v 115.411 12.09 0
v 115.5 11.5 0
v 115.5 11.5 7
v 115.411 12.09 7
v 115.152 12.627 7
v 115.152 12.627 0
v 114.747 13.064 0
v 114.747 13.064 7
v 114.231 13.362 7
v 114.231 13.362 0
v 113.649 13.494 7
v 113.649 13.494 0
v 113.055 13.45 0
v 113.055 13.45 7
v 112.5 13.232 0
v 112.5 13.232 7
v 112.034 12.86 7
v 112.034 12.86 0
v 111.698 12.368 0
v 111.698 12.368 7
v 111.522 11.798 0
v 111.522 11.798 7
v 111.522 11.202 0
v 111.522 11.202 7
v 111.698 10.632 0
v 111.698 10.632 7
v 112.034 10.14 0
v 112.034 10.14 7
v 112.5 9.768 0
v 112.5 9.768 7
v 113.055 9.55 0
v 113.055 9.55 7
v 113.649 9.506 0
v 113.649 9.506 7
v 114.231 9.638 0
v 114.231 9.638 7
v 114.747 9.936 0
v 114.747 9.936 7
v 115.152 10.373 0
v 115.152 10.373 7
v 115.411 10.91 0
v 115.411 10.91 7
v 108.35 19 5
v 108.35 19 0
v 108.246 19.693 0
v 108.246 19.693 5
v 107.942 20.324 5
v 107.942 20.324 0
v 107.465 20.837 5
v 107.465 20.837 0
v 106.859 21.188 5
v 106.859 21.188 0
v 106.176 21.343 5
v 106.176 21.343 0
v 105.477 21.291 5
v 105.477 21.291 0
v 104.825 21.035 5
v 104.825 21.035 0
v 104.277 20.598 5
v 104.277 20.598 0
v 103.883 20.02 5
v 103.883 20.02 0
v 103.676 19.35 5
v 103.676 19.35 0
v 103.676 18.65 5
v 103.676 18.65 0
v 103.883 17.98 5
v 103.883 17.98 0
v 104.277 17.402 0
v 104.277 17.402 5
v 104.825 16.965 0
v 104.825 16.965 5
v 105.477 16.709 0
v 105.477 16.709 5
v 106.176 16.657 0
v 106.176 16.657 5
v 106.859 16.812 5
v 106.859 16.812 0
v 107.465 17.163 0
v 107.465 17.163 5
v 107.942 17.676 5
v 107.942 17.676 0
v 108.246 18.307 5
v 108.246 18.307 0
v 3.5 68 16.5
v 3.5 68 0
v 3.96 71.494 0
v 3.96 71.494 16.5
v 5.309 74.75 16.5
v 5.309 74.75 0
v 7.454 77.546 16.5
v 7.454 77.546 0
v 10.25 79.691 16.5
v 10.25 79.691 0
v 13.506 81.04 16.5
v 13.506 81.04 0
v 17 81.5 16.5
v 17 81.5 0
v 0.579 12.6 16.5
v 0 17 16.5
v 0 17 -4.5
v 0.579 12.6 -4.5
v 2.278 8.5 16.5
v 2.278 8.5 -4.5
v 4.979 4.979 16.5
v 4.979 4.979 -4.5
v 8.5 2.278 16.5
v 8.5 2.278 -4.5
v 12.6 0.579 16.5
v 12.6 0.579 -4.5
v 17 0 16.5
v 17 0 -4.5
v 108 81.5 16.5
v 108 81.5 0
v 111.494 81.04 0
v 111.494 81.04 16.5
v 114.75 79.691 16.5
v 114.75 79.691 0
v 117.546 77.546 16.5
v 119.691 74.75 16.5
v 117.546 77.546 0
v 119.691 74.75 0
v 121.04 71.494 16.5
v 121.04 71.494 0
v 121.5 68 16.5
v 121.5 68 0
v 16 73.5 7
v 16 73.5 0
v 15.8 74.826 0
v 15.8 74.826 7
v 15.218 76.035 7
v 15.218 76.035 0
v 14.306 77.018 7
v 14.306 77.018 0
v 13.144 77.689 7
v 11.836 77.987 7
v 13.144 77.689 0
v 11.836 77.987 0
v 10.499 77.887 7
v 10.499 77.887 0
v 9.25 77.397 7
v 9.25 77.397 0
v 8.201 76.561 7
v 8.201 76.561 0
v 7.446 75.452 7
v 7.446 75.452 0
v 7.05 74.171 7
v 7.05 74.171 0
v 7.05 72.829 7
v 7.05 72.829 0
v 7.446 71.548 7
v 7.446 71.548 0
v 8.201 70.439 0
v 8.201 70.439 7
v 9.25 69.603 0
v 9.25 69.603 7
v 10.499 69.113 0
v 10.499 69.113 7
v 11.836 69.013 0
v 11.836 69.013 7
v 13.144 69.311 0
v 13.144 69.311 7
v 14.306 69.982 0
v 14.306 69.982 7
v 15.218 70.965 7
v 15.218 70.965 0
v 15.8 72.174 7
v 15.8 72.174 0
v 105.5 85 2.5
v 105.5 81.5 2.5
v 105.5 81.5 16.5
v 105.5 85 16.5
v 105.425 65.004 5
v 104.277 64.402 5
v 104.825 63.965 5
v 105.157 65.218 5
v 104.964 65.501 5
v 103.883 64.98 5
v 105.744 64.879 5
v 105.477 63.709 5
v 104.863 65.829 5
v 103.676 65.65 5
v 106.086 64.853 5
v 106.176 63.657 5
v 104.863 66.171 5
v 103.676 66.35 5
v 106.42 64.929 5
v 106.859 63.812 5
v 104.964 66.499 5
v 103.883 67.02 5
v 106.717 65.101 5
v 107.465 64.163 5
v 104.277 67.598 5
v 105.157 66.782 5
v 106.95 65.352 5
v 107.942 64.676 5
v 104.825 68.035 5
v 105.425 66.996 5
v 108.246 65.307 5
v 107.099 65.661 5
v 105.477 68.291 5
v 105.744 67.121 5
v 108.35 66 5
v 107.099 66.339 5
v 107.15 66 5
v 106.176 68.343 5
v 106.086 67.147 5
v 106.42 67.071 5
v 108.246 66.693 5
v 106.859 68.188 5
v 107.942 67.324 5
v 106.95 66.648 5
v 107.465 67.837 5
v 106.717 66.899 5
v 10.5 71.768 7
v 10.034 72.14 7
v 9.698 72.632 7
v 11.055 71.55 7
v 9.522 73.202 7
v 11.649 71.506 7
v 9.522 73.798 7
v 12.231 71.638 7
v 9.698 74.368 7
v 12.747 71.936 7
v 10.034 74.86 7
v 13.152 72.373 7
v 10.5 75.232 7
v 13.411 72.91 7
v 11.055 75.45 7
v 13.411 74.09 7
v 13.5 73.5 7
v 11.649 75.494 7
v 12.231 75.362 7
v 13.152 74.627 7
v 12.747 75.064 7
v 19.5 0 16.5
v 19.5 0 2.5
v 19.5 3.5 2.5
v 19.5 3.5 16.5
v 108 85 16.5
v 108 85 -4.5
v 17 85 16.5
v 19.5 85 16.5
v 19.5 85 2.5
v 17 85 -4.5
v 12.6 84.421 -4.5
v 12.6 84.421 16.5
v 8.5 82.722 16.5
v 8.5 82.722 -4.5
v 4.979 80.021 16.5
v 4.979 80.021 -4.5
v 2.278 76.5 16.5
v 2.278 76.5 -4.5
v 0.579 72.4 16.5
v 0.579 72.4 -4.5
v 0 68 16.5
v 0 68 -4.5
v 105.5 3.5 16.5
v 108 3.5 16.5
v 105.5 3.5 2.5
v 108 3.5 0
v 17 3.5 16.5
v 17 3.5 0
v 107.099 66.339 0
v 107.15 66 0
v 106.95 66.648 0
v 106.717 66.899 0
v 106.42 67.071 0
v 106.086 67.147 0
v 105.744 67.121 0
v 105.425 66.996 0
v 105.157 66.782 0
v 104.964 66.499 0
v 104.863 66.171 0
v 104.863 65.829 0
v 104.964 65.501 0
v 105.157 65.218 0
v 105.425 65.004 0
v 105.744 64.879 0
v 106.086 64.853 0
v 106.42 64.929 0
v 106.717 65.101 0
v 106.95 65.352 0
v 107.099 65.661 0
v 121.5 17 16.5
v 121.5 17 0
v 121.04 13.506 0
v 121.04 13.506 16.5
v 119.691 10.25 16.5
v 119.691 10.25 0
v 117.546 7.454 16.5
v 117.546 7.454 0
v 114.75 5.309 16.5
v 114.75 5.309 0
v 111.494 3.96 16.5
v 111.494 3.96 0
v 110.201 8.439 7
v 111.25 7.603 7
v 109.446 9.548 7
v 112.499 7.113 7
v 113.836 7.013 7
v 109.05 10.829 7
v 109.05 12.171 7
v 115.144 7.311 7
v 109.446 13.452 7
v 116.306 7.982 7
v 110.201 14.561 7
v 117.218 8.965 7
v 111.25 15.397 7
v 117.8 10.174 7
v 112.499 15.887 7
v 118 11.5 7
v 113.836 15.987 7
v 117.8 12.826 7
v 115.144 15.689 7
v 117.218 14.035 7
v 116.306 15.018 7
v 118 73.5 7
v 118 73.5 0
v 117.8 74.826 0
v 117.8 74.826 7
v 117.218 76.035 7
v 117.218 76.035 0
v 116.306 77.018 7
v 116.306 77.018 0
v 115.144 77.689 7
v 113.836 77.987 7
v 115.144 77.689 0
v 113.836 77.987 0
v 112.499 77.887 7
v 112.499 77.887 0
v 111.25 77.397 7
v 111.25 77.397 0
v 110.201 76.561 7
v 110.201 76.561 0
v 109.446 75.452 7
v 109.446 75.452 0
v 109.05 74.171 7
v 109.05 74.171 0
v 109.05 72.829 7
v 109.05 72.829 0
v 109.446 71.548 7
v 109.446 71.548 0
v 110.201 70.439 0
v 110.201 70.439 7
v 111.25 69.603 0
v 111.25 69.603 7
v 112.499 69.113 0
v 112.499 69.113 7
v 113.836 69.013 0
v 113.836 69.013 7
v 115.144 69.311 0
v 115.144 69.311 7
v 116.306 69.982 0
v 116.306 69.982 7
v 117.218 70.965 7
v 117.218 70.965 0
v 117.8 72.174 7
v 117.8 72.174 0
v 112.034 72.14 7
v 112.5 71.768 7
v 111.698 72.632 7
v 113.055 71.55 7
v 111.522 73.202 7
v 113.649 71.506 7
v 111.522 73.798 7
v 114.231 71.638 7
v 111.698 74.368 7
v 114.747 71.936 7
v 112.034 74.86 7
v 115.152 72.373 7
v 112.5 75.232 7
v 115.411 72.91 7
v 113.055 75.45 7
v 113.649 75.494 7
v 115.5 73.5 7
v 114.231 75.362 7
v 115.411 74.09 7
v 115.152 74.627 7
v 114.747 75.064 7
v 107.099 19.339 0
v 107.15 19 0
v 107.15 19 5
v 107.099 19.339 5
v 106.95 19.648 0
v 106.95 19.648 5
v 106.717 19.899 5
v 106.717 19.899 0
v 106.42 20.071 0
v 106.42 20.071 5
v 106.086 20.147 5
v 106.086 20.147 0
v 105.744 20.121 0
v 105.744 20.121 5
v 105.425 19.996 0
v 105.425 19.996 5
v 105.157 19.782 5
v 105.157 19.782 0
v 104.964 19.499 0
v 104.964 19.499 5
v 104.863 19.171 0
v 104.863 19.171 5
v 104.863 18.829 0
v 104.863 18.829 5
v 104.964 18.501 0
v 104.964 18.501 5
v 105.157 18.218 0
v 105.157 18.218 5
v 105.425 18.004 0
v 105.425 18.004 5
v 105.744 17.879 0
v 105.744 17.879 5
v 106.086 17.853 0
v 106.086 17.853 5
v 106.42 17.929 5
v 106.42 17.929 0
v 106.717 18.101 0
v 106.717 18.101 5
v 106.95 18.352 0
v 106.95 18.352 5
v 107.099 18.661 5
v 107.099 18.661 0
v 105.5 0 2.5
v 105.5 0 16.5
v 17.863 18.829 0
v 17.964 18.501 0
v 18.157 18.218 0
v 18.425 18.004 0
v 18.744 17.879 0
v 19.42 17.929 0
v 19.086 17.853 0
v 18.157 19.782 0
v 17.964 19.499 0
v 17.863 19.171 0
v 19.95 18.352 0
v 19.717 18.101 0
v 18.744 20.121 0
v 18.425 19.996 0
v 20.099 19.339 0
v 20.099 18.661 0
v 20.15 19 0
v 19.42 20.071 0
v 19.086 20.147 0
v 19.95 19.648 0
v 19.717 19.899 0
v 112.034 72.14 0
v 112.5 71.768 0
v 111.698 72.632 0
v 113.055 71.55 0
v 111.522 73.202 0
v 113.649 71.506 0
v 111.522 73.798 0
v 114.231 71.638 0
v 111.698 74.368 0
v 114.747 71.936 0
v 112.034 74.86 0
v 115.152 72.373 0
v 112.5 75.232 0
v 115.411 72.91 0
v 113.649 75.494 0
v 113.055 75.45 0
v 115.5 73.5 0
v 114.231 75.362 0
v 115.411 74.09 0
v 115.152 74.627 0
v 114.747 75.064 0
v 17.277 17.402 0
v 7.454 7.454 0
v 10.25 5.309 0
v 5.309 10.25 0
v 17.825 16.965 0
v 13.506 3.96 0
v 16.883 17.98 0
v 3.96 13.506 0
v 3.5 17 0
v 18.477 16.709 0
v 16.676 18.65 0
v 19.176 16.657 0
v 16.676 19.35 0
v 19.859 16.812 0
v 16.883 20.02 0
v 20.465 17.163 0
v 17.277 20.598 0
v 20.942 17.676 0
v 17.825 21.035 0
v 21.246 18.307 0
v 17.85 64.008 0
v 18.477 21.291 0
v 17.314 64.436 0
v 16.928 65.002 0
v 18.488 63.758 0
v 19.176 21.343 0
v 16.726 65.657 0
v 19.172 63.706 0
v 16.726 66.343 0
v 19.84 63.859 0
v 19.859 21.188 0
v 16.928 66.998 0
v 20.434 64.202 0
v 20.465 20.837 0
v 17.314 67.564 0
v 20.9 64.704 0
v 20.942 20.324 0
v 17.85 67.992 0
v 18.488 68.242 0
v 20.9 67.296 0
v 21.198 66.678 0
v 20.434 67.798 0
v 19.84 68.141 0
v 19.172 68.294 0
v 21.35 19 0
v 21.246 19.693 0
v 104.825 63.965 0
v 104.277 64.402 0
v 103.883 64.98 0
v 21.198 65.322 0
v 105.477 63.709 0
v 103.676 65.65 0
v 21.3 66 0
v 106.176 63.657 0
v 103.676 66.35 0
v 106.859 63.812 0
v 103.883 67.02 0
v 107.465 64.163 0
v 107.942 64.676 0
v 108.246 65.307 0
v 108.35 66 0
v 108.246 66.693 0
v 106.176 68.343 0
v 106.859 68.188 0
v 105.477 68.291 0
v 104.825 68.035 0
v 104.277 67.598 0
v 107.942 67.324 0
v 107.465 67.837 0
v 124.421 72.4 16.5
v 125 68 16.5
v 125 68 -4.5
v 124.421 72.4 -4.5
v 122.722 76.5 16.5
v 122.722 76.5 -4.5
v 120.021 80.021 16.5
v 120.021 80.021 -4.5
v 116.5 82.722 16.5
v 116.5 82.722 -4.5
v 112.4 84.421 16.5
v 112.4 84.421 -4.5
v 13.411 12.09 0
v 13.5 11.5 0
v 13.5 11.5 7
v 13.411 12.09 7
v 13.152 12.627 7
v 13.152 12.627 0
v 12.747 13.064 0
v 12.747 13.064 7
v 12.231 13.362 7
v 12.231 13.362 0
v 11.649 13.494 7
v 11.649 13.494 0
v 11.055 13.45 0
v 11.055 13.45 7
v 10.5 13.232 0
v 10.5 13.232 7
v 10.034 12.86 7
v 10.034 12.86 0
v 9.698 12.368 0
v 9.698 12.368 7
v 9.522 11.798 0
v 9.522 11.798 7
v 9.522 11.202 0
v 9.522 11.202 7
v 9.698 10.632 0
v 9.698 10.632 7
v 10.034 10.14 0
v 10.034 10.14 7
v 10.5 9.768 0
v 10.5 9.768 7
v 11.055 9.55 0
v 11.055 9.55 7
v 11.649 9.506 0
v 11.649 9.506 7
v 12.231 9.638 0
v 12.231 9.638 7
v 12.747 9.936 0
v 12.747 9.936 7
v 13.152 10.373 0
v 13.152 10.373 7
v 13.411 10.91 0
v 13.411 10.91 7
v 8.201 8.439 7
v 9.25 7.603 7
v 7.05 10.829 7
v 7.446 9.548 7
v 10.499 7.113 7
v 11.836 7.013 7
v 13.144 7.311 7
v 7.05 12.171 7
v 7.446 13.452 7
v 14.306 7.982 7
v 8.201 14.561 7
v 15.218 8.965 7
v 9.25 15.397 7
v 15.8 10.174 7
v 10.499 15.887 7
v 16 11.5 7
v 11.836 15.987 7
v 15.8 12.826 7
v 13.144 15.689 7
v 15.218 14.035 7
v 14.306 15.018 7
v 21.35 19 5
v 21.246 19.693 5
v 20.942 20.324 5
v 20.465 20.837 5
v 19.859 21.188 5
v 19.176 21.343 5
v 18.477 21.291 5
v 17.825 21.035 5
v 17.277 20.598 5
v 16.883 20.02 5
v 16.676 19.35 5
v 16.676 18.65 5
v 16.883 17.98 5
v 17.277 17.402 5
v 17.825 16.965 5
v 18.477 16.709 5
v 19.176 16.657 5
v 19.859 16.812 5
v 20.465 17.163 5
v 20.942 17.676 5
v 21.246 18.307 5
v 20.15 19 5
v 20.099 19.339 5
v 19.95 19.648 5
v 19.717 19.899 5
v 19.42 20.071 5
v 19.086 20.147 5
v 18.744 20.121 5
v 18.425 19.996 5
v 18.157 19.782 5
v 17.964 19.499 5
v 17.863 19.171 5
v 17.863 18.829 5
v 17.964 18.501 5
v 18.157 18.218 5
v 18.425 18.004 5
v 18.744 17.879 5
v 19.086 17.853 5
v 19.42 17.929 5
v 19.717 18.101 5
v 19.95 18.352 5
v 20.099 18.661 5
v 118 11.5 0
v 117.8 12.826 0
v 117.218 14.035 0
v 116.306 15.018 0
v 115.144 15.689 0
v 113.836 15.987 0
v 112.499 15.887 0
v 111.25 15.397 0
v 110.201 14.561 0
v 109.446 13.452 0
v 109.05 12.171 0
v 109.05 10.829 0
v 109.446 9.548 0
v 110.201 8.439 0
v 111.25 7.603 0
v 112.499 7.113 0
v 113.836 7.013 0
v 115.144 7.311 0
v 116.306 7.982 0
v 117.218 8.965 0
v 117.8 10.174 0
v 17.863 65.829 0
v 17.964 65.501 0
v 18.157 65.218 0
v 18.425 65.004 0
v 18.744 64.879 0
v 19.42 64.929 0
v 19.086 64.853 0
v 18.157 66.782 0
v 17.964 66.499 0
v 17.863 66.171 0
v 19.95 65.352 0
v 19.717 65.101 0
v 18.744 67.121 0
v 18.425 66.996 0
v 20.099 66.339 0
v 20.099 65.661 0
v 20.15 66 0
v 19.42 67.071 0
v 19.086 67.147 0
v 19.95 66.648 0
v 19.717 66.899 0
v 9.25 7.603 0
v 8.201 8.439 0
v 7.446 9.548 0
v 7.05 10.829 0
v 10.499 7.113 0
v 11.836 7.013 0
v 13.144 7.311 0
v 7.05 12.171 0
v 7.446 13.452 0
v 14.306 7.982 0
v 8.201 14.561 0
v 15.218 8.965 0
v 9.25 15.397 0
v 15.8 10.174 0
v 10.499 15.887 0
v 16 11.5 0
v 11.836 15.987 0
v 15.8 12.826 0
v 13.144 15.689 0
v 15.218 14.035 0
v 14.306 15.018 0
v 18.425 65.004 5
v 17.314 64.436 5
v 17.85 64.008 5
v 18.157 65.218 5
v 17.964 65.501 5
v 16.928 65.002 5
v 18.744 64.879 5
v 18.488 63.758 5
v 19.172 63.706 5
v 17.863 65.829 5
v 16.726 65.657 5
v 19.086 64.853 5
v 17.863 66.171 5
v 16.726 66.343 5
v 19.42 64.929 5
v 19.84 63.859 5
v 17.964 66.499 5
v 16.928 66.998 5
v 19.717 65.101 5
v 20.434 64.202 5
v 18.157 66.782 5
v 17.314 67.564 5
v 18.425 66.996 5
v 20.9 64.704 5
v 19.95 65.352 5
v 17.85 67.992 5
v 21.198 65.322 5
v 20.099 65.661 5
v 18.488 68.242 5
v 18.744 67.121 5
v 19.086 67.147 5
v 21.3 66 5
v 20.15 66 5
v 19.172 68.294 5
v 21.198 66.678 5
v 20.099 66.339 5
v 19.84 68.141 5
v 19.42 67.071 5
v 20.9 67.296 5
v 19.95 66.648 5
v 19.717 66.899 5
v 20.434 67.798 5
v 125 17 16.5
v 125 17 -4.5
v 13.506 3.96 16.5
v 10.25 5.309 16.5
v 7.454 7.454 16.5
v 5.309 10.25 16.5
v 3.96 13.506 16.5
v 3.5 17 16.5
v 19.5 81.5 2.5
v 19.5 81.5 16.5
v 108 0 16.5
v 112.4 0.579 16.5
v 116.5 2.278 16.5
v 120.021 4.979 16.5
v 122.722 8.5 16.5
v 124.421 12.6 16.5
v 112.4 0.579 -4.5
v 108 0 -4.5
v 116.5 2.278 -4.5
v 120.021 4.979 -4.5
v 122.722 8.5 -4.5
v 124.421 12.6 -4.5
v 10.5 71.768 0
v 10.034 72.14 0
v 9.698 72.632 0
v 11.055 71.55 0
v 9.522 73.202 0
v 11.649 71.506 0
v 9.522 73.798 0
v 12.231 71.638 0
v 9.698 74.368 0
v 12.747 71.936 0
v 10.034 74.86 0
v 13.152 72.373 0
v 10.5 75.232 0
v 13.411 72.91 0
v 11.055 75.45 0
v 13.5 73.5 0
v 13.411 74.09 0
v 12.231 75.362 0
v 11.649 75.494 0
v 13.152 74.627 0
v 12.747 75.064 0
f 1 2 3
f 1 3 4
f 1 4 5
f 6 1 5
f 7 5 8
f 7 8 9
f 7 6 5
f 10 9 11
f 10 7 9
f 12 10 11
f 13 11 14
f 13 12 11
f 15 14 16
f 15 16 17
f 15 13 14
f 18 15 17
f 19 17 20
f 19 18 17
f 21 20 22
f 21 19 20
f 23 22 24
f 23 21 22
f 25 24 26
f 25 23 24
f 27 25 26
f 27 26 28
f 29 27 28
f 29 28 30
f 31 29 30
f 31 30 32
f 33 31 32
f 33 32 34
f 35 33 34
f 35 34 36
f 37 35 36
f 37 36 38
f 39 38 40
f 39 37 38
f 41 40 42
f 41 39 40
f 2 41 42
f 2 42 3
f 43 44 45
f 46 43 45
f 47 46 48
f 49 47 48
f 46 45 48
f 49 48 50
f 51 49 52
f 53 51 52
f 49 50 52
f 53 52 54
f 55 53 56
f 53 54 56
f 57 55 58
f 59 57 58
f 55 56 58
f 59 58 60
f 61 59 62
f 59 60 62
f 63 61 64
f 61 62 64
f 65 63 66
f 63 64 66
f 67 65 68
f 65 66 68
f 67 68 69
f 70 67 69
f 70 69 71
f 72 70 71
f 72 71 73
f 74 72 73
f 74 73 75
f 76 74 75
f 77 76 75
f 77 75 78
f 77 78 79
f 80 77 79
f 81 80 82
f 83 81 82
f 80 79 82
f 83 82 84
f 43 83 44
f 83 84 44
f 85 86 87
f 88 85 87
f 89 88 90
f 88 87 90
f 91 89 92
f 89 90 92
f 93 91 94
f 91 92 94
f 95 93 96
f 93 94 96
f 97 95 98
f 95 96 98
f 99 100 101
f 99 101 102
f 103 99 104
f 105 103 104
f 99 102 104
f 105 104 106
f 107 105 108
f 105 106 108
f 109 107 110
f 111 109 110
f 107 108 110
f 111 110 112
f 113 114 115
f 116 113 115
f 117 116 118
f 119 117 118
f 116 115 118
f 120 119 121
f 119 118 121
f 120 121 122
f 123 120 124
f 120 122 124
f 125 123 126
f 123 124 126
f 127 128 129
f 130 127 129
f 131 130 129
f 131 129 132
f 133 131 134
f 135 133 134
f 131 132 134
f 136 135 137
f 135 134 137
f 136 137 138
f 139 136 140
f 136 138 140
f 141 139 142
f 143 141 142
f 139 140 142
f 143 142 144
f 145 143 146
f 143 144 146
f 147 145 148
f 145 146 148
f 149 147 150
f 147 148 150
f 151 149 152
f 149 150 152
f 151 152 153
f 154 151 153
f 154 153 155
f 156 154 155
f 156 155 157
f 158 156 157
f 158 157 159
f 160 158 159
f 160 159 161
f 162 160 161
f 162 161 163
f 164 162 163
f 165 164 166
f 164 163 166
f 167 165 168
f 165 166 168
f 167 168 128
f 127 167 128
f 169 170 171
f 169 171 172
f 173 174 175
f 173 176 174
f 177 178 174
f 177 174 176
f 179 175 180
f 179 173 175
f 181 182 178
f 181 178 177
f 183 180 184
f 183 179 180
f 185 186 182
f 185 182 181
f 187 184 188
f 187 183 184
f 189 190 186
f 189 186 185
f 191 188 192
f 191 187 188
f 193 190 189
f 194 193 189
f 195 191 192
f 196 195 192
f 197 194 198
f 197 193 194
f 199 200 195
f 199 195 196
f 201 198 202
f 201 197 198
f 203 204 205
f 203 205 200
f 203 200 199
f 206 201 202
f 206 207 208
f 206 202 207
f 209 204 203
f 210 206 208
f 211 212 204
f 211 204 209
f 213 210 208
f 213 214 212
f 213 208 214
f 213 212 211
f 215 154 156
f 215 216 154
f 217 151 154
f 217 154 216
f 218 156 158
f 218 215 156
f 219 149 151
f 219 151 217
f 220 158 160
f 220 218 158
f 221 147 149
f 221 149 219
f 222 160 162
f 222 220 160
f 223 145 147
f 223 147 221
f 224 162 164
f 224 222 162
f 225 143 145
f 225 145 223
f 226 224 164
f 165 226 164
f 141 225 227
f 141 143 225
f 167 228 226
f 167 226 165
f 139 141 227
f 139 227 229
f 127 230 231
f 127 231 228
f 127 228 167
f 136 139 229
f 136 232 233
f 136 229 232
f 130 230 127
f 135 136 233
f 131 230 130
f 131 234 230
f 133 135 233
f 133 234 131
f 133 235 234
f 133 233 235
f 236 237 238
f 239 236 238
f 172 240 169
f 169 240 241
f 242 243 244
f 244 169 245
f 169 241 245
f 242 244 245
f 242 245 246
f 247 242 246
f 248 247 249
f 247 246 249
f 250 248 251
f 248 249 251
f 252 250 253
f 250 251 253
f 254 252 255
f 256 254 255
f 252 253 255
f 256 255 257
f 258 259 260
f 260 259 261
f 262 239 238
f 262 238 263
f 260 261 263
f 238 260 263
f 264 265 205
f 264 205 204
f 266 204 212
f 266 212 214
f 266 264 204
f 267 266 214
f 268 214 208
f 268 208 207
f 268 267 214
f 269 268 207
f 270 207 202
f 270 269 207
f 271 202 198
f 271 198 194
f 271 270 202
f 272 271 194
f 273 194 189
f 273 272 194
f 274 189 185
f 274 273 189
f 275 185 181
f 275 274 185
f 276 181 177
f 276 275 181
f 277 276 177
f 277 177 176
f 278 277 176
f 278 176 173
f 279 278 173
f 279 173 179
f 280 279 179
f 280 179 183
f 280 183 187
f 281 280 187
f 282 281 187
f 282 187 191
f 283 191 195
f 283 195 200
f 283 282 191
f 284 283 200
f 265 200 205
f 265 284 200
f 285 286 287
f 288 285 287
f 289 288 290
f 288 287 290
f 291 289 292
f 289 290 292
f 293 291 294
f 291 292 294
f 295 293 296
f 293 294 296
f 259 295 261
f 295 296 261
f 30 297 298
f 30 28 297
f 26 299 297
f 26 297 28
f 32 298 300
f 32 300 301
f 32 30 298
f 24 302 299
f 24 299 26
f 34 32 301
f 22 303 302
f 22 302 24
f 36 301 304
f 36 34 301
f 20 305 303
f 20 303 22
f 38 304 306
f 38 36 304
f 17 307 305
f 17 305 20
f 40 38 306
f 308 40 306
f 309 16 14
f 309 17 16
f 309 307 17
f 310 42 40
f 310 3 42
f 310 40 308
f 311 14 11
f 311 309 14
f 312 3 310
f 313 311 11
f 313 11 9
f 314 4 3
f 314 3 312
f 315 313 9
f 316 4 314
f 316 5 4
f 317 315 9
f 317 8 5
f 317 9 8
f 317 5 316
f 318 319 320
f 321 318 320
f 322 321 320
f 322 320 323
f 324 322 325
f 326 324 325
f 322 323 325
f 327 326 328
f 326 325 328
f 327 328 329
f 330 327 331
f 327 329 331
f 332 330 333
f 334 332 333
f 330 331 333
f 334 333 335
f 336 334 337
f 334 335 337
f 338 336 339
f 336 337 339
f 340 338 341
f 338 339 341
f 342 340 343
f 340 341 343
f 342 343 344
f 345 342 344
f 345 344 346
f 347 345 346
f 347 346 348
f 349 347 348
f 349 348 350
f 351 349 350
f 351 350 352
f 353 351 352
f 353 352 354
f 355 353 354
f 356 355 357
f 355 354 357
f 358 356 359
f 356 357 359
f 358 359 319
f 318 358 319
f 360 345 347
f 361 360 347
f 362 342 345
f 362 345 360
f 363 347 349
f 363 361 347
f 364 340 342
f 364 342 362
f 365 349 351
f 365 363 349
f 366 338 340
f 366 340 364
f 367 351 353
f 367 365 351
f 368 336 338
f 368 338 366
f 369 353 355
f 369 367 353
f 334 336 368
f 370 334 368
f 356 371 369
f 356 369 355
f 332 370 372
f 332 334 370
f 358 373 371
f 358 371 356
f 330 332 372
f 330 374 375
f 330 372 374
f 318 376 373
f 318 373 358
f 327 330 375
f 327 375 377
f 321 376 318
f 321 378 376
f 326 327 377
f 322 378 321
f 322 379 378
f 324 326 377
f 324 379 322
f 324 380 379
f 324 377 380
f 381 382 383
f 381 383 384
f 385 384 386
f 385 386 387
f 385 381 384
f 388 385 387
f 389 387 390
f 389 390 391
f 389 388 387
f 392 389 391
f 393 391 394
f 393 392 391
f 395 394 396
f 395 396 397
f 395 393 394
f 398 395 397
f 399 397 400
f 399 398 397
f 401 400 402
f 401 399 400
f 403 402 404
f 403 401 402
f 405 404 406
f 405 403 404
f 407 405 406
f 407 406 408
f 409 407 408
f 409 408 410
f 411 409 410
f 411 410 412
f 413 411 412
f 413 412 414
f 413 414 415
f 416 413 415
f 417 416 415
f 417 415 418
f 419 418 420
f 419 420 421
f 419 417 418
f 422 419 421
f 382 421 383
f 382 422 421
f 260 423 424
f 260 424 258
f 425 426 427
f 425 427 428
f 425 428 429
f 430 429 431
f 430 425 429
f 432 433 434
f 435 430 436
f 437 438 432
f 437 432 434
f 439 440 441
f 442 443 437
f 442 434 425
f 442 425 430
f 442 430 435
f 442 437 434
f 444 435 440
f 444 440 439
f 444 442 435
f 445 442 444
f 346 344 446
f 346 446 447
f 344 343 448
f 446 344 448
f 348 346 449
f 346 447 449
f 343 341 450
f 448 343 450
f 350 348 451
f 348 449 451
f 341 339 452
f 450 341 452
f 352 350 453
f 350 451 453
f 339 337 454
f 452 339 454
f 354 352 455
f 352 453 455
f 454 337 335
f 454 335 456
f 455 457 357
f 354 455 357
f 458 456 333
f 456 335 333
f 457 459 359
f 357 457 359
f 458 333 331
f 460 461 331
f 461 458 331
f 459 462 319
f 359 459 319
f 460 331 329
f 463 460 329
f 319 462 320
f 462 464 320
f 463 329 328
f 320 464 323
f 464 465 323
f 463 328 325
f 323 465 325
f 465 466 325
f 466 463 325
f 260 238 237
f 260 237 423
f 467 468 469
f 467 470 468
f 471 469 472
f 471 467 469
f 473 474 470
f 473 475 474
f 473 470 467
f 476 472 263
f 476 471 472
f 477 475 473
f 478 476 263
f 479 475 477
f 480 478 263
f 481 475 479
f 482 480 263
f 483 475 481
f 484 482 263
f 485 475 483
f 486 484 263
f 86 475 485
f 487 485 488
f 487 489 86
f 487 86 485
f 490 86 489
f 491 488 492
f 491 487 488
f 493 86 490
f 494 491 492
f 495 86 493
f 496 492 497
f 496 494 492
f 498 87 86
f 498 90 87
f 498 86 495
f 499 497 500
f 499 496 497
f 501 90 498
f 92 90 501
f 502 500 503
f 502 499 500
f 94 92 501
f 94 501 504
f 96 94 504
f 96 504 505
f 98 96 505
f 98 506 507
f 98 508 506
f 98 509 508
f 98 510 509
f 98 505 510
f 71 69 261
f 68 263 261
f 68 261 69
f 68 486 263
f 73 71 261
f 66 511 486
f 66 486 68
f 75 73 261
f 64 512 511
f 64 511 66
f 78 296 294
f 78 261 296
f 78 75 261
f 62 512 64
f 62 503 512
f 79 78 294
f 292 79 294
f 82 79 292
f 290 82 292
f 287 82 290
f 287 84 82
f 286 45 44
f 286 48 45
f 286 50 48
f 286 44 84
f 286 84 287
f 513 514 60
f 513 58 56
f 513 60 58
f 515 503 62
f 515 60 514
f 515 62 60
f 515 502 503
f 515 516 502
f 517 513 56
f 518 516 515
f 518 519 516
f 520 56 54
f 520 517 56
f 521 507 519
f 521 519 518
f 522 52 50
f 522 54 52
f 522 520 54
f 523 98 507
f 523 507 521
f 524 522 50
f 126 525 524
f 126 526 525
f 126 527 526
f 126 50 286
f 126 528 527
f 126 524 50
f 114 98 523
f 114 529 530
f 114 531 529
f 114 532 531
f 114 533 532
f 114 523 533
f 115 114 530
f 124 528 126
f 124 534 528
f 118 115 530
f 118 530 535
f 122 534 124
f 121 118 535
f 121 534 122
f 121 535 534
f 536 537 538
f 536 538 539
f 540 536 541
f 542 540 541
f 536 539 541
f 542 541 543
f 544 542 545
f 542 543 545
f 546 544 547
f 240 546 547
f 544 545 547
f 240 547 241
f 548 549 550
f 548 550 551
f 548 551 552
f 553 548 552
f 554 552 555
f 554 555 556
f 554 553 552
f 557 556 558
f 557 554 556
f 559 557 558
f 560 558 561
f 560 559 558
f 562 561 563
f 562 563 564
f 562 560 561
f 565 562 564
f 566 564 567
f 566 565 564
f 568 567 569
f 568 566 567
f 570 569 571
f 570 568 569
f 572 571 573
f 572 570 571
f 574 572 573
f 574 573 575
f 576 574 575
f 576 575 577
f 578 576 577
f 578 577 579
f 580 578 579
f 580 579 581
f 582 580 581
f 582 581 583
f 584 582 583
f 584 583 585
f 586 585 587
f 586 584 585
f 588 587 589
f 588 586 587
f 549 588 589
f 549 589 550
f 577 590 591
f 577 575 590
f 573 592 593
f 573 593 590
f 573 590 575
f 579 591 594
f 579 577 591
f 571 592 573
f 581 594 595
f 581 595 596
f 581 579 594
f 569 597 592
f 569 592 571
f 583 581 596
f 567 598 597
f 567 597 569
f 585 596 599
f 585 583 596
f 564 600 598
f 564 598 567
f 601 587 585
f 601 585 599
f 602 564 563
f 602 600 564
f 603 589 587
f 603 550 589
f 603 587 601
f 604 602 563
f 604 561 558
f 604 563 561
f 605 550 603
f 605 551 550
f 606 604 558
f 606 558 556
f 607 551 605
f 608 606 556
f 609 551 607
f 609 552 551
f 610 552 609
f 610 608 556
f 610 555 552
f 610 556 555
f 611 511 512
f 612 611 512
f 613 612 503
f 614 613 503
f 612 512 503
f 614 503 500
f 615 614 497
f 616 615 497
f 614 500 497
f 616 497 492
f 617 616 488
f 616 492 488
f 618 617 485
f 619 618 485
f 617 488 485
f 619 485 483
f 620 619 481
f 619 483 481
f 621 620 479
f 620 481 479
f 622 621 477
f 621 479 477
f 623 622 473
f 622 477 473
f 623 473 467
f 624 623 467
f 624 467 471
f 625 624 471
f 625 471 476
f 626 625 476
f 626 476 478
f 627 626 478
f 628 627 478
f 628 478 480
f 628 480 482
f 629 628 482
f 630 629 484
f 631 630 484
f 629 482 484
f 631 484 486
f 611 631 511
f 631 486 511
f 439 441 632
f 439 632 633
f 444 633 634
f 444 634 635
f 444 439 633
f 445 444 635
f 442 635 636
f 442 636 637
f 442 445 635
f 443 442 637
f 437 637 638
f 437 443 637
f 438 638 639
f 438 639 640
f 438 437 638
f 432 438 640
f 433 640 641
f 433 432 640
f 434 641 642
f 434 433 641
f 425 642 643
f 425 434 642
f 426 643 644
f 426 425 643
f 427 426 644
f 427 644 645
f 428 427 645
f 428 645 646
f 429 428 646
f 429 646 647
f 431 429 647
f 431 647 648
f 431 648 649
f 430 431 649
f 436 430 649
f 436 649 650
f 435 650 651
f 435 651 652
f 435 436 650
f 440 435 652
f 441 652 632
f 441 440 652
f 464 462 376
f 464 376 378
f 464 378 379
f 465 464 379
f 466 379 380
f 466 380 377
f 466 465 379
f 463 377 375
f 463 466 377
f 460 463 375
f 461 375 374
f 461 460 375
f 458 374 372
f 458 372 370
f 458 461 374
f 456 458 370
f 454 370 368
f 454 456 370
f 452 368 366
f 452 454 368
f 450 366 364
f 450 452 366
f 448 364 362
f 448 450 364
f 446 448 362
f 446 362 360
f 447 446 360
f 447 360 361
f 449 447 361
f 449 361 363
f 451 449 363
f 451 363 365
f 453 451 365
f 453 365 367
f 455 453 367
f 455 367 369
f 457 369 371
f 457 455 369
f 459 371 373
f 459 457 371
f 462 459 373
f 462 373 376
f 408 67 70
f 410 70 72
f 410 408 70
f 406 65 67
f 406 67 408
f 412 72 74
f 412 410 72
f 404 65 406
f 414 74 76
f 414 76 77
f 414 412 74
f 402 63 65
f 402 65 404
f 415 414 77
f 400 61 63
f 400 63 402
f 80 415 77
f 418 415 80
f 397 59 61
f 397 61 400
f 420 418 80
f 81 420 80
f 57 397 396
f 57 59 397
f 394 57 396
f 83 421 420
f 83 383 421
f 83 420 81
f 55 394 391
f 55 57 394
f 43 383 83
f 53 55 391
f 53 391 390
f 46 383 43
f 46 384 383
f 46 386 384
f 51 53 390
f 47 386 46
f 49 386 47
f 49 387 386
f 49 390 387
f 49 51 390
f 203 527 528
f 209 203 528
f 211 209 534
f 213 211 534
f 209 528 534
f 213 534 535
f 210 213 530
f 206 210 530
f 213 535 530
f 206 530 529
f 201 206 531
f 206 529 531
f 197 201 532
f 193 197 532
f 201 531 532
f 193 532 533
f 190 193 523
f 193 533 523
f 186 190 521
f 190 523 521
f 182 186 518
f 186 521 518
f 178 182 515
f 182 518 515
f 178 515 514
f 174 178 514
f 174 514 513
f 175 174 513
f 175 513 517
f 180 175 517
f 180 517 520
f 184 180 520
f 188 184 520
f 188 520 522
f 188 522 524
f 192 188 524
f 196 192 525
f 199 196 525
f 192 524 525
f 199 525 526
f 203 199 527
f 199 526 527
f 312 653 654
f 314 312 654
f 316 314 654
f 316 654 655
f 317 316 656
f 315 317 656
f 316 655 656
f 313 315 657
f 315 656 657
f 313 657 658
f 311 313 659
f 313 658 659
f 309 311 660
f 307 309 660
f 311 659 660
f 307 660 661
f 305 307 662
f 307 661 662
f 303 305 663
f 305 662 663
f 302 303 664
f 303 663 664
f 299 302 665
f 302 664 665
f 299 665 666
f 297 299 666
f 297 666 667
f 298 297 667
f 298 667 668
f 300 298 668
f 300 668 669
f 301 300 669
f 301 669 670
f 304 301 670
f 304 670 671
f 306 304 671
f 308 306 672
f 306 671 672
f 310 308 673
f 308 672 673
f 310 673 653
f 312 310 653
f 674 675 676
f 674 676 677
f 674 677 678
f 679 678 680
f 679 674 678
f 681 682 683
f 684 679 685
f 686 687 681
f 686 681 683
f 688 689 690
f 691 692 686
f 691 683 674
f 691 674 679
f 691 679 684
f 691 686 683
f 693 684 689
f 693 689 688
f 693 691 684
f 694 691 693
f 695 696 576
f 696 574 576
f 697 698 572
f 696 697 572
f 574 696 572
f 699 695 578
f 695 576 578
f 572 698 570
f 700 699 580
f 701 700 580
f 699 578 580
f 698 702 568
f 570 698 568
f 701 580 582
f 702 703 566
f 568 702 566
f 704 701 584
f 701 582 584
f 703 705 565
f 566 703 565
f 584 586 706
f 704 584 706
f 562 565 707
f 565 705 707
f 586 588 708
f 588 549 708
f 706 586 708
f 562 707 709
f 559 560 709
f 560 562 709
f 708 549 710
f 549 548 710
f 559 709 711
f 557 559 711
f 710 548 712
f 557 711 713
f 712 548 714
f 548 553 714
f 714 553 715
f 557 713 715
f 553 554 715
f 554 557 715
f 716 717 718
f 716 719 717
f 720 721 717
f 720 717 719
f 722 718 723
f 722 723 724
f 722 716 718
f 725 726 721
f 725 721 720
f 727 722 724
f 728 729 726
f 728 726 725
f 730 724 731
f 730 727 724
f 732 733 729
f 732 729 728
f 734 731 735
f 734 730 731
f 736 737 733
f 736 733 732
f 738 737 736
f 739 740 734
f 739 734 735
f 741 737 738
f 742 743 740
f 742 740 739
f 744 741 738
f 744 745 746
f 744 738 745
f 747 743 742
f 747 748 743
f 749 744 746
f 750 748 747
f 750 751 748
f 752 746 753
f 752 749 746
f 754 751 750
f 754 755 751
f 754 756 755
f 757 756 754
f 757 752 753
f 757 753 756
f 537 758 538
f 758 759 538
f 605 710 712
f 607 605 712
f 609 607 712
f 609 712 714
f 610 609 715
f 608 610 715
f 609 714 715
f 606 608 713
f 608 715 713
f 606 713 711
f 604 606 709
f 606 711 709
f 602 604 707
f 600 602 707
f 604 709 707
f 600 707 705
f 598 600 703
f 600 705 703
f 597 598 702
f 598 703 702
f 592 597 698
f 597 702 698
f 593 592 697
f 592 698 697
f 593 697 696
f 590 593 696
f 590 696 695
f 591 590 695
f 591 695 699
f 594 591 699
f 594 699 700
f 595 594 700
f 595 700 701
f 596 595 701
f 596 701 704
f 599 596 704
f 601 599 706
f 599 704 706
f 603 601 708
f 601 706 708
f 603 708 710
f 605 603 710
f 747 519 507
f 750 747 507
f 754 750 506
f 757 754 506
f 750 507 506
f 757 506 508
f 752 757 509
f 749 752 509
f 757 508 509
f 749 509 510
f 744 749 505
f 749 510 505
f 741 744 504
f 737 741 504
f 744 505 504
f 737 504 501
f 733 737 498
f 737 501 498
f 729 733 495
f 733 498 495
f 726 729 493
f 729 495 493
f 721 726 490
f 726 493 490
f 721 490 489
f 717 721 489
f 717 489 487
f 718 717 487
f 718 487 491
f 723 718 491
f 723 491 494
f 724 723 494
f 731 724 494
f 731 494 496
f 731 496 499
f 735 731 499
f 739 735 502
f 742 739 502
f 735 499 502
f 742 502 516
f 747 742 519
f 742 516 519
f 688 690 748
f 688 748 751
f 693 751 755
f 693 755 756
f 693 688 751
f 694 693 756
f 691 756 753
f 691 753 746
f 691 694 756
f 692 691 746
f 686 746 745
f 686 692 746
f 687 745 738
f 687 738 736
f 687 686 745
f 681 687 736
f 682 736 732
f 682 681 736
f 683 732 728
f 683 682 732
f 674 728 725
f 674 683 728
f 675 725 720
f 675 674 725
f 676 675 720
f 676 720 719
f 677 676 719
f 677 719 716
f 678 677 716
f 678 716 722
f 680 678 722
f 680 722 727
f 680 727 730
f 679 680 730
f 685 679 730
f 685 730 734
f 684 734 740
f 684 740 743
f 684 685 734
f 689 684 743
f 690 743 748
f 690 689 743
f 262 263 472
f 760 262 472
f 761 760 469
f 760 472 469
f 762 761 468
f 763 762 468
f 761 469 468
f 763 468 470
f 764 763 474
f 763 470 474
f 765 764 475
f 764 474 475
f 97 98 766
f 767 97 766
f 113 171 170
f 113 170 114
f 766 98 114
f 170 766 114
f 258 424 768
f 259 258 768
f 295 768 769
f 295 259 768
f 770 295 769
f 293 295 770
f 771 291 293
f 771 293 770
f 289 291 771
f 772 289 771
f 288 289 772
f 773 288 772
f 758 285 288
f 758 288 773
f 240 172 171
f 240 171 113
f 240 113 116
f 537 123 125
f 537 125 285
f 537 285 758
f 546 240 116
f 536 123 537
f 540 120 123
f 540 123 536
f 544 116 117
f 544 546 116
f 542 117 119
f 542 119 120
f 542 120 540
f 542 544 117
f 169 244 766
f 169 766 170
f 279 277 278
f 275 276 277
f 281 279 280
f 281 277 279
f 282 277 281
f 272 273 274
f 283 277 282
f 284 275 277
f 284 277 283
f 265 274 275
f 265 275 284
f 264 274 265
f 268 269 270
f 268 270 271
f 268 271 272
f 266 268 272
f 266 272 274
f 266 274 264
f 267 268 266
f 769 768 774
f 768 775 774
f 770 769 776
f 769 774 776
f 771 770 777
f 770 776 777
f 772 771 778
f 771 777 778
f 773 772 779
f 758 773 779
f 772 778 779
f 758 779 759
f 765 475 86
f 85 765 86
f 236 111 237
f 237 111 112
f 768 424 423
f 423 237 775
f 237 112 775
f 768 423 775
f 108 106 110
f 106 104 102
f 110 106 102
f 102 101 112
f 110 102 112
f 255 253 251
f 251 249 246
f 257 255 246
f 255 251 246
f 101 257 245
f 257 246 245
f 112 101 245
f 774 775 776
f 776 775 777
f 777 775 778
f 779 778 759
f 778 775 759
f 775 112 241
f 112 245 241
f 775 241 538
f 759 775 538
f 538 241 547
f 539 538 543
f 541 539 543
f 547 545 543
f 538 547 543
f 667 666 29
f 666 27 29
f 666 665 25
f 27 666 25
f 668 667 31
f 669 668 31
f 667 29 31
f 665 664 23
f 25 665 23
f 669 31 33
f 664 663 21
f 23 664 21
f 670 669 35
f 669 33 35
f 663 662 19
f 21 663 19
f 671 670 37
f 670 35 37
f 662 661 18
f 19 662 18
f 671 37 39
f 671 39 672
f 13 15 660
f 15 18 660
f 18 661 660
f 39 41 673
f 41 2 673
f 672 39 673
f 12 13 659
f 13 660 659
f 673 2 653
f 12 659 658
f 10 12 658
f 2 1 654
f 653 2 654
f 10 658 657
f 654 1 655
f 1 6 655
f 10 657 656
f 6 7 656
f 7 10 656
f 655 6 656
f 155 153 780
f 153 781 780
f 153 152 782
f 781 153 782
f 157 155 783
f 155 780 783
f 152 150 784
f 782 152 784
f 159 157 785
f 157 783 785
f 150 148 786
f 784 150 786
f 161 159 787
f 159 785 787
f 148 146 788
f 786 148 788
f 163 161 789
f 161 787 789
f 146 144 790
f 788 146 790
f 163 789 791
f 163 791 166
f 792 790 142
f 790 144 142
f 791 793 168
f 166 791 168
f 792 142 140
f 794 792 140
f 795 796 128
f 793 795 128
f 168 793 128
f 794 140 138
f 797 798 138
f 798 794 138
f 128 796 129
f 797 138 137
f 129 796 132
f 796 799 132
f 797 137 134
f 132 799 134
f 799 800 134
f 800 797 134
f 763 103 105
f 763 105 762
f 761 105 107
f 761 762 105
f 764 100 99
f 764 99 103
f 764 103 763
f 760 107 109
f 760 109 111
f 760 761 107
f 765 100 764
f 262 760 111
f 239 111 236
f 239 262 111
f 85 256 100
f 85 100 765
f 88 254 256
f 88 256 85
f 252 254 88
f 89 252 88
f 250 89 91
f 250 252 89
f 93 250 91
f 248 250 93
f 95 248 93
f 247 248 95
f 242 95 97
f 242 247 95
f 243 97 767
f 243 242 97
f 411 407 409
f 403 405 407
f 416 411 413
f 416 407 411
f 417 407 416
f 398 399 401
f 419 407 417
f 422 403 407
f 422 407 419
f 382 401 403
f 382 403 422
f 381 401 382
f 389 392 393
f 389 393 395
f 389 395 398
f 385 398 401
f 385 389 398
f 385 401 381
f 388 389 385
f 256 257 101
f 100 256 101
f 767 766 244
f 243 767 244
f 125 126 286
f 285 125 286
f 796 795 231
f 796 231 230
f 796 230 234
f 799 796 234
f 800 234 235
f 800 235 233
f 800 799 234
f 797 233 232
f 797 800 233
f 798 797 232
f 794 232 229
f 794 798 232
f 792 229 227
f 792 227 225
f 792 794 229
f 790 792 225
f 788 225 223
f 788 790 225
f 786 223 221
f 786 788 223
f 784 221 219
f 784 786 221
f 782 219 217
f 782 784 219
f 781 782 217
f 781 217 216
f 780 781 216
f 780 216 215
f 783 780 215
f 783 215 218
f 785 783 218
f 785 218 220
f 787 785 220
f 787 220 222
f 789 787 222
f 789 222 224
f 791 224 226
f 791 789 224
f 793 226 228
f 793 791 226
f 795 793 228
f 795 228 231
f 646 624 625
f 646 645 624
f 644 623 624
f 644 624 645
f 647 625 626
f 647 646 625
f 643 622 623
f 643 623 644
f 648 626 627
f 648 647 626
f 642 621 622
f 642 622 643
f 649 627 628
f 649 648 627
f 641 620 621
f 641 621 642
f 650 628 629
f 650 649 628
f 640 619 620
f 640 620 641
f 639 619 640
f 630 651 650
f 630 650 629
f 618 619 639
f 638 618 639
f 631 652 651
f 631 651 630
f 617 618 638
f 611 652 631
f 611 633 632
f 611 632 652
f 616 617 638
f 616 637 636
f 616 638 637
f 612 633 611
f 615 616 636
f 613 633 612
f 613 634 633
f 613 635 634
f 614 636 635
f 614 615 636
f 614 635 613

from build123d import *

# Parameters (mm, degrees)
F1_DEPTH  = 4.5
F2_R      = 4.5
F2_R_2    = 2
F2_R_3    = 1.999996
F3_DEPTH  = 7
F5_DEPTH  = 16.5
F6_R      = 2.3
F6_R_2    = 1.15
F6_R_3    = 2.35
F7_DEPTH  = 5
F9_W      = 86
F9_H      = 14.080024
F9_H_2    = 11.670903
F10_DEPTH = 50.8


with BuildPart() as f1:
    # F0 (on Top) → F1 (new body)
    with BuildSketch(Plane.XY):
        with BuildLine():
            ThreePointArc((0, 17), (4.979185, 4.979185), (17, 0))
            Line((17, 0), (108, 0))
            ThreePointArc((108, 0), (120.020815, 4.979185), (125, 17))
            Line((125, 17), (125, 68))
            ThreePointArc((125, 68), (120.020815, 80.020815), (108, 85))
            Line((108, 85), (17, 85))
            ThreePointArc((17, 85), (4.979185, 80.020815), (0, 68))
            Line((0, 68), (0, 17))
        make_face()
    extrude(amount=-F1_DEPTH)

    # F4 (on Top) → F5 (join)
    with BuildSketch(Plane.XY):
        with BuildLine():
            ThreePointArc((0, 17), (4.979185, 4.979185), (17, 0))
            Line((17, 0), (108, 0))
            ThreePointArc((108, 0), (120.020815, 4.979185), (125, 17))
            Line((125, 17), (125, 68))
            ThreePointArc((125, 68), (120.020815, 80.020815), (108, 85))
            Line((108, 85), (17, 85))
            ThreePointArc((17, 85), (4.979185, 80.020815), (0, 68))
            Line((0, 68), (0, 17))
        make_face()
        with BuildLine():
            ThreePointArc((3.5, 68), (7.454058, 77.545942), (17, 81.5))
            Line((17, 81.5), (108, 81.5))
            ThreePointArc((108, 81.5), (117.545942, 77.545942), (121.5, 68))
            Line((121.5, 68), (121.5, 17))
            ThreePointArc((121.5, 17), (117.545942, 7.454058), (108, 3.5))
            Line((108, 3.5), (17, 3.5))
            ThreePointArc((17, 3.5), (7.454058, 7.454058), (3.5, 17))
            Line((3.5, 17), (3.5, 68))
        make_face(mode=Mode.SUBTRACT)
    extrude(amount=F5_DEPTH)

    # F6 (on Top) → F7 (join)
    with BuildSketch(Plane.XY):
        with Locations((19, 66)):
            Circle(F6_R)
        with Locations((19, 66)):
            Circle(F6_R_2, mode=Mode.SUBTRACT)
        with Locations((106, 66)):
            Circle(F6_R_3)
        with Locations((106, 66)):
            Circle(F6_R_2, mode=Mode.SUBTRACT)
        with Locations((106, 19)):
            Circle(F6_R_3)
        with Locations((106, 19)):
            Circle(F6_R_2, mode=Mode.SUBTRACT)
        with Locations((19, 19)):
            Circle(F6_R_3)
        with Locations((19, 19)):
            Circle(F6_R_2, mode=Mode.SUBTRACT)
    extrude(amount=F7_DEPTH)

    # F9 (on offset) → F10 (cut)
    with BuildSketch(Plane.XY.offset(2.5)):
        with Locations((62.5, 77.959988)):
            Rectangle(F9_W, F9_H)
        with Locations((62.5, 5.835451)):
            Rectangle(F9_W, F9_H_2)
    extrude(amount=F10_DEPTH, mode=Mode.SUBTRACT)


with BuildPart() as f3:
    # F2 (on Top) → F3 (new body)
    with BuildSketch(Plane.XY):
        with Locations((11.5, 73.5)):
            Circle(F2_R)
        with Locations((11.5, 73.5)):
            Circle(F2_R_2, mode=Mode.SUBTRACT)
        with Locations((113.5, 73.5)):
            Circle(F2_R)
        with Locations((113.5, 73.5)):
            Circle(F2_R_3, mode=Mode.SUBTRACT)
        with Locations((11.5, 11.5)):
            Circle(F2_R)
        with Locations((11.5, 11.5)):
            Circle(F2_R_3, mode=Mode.SUBTRACT)
        with Locations((113.5, 11.5)):
            Circle(F2_R)
        with Locations((113.5, 11.5)):
            Circle(F2_R_3, mode=Mode.SUBTRACT)
    extrude(amount=F3_DEPTH)


solid = Compound([f1.part, f3.part])
